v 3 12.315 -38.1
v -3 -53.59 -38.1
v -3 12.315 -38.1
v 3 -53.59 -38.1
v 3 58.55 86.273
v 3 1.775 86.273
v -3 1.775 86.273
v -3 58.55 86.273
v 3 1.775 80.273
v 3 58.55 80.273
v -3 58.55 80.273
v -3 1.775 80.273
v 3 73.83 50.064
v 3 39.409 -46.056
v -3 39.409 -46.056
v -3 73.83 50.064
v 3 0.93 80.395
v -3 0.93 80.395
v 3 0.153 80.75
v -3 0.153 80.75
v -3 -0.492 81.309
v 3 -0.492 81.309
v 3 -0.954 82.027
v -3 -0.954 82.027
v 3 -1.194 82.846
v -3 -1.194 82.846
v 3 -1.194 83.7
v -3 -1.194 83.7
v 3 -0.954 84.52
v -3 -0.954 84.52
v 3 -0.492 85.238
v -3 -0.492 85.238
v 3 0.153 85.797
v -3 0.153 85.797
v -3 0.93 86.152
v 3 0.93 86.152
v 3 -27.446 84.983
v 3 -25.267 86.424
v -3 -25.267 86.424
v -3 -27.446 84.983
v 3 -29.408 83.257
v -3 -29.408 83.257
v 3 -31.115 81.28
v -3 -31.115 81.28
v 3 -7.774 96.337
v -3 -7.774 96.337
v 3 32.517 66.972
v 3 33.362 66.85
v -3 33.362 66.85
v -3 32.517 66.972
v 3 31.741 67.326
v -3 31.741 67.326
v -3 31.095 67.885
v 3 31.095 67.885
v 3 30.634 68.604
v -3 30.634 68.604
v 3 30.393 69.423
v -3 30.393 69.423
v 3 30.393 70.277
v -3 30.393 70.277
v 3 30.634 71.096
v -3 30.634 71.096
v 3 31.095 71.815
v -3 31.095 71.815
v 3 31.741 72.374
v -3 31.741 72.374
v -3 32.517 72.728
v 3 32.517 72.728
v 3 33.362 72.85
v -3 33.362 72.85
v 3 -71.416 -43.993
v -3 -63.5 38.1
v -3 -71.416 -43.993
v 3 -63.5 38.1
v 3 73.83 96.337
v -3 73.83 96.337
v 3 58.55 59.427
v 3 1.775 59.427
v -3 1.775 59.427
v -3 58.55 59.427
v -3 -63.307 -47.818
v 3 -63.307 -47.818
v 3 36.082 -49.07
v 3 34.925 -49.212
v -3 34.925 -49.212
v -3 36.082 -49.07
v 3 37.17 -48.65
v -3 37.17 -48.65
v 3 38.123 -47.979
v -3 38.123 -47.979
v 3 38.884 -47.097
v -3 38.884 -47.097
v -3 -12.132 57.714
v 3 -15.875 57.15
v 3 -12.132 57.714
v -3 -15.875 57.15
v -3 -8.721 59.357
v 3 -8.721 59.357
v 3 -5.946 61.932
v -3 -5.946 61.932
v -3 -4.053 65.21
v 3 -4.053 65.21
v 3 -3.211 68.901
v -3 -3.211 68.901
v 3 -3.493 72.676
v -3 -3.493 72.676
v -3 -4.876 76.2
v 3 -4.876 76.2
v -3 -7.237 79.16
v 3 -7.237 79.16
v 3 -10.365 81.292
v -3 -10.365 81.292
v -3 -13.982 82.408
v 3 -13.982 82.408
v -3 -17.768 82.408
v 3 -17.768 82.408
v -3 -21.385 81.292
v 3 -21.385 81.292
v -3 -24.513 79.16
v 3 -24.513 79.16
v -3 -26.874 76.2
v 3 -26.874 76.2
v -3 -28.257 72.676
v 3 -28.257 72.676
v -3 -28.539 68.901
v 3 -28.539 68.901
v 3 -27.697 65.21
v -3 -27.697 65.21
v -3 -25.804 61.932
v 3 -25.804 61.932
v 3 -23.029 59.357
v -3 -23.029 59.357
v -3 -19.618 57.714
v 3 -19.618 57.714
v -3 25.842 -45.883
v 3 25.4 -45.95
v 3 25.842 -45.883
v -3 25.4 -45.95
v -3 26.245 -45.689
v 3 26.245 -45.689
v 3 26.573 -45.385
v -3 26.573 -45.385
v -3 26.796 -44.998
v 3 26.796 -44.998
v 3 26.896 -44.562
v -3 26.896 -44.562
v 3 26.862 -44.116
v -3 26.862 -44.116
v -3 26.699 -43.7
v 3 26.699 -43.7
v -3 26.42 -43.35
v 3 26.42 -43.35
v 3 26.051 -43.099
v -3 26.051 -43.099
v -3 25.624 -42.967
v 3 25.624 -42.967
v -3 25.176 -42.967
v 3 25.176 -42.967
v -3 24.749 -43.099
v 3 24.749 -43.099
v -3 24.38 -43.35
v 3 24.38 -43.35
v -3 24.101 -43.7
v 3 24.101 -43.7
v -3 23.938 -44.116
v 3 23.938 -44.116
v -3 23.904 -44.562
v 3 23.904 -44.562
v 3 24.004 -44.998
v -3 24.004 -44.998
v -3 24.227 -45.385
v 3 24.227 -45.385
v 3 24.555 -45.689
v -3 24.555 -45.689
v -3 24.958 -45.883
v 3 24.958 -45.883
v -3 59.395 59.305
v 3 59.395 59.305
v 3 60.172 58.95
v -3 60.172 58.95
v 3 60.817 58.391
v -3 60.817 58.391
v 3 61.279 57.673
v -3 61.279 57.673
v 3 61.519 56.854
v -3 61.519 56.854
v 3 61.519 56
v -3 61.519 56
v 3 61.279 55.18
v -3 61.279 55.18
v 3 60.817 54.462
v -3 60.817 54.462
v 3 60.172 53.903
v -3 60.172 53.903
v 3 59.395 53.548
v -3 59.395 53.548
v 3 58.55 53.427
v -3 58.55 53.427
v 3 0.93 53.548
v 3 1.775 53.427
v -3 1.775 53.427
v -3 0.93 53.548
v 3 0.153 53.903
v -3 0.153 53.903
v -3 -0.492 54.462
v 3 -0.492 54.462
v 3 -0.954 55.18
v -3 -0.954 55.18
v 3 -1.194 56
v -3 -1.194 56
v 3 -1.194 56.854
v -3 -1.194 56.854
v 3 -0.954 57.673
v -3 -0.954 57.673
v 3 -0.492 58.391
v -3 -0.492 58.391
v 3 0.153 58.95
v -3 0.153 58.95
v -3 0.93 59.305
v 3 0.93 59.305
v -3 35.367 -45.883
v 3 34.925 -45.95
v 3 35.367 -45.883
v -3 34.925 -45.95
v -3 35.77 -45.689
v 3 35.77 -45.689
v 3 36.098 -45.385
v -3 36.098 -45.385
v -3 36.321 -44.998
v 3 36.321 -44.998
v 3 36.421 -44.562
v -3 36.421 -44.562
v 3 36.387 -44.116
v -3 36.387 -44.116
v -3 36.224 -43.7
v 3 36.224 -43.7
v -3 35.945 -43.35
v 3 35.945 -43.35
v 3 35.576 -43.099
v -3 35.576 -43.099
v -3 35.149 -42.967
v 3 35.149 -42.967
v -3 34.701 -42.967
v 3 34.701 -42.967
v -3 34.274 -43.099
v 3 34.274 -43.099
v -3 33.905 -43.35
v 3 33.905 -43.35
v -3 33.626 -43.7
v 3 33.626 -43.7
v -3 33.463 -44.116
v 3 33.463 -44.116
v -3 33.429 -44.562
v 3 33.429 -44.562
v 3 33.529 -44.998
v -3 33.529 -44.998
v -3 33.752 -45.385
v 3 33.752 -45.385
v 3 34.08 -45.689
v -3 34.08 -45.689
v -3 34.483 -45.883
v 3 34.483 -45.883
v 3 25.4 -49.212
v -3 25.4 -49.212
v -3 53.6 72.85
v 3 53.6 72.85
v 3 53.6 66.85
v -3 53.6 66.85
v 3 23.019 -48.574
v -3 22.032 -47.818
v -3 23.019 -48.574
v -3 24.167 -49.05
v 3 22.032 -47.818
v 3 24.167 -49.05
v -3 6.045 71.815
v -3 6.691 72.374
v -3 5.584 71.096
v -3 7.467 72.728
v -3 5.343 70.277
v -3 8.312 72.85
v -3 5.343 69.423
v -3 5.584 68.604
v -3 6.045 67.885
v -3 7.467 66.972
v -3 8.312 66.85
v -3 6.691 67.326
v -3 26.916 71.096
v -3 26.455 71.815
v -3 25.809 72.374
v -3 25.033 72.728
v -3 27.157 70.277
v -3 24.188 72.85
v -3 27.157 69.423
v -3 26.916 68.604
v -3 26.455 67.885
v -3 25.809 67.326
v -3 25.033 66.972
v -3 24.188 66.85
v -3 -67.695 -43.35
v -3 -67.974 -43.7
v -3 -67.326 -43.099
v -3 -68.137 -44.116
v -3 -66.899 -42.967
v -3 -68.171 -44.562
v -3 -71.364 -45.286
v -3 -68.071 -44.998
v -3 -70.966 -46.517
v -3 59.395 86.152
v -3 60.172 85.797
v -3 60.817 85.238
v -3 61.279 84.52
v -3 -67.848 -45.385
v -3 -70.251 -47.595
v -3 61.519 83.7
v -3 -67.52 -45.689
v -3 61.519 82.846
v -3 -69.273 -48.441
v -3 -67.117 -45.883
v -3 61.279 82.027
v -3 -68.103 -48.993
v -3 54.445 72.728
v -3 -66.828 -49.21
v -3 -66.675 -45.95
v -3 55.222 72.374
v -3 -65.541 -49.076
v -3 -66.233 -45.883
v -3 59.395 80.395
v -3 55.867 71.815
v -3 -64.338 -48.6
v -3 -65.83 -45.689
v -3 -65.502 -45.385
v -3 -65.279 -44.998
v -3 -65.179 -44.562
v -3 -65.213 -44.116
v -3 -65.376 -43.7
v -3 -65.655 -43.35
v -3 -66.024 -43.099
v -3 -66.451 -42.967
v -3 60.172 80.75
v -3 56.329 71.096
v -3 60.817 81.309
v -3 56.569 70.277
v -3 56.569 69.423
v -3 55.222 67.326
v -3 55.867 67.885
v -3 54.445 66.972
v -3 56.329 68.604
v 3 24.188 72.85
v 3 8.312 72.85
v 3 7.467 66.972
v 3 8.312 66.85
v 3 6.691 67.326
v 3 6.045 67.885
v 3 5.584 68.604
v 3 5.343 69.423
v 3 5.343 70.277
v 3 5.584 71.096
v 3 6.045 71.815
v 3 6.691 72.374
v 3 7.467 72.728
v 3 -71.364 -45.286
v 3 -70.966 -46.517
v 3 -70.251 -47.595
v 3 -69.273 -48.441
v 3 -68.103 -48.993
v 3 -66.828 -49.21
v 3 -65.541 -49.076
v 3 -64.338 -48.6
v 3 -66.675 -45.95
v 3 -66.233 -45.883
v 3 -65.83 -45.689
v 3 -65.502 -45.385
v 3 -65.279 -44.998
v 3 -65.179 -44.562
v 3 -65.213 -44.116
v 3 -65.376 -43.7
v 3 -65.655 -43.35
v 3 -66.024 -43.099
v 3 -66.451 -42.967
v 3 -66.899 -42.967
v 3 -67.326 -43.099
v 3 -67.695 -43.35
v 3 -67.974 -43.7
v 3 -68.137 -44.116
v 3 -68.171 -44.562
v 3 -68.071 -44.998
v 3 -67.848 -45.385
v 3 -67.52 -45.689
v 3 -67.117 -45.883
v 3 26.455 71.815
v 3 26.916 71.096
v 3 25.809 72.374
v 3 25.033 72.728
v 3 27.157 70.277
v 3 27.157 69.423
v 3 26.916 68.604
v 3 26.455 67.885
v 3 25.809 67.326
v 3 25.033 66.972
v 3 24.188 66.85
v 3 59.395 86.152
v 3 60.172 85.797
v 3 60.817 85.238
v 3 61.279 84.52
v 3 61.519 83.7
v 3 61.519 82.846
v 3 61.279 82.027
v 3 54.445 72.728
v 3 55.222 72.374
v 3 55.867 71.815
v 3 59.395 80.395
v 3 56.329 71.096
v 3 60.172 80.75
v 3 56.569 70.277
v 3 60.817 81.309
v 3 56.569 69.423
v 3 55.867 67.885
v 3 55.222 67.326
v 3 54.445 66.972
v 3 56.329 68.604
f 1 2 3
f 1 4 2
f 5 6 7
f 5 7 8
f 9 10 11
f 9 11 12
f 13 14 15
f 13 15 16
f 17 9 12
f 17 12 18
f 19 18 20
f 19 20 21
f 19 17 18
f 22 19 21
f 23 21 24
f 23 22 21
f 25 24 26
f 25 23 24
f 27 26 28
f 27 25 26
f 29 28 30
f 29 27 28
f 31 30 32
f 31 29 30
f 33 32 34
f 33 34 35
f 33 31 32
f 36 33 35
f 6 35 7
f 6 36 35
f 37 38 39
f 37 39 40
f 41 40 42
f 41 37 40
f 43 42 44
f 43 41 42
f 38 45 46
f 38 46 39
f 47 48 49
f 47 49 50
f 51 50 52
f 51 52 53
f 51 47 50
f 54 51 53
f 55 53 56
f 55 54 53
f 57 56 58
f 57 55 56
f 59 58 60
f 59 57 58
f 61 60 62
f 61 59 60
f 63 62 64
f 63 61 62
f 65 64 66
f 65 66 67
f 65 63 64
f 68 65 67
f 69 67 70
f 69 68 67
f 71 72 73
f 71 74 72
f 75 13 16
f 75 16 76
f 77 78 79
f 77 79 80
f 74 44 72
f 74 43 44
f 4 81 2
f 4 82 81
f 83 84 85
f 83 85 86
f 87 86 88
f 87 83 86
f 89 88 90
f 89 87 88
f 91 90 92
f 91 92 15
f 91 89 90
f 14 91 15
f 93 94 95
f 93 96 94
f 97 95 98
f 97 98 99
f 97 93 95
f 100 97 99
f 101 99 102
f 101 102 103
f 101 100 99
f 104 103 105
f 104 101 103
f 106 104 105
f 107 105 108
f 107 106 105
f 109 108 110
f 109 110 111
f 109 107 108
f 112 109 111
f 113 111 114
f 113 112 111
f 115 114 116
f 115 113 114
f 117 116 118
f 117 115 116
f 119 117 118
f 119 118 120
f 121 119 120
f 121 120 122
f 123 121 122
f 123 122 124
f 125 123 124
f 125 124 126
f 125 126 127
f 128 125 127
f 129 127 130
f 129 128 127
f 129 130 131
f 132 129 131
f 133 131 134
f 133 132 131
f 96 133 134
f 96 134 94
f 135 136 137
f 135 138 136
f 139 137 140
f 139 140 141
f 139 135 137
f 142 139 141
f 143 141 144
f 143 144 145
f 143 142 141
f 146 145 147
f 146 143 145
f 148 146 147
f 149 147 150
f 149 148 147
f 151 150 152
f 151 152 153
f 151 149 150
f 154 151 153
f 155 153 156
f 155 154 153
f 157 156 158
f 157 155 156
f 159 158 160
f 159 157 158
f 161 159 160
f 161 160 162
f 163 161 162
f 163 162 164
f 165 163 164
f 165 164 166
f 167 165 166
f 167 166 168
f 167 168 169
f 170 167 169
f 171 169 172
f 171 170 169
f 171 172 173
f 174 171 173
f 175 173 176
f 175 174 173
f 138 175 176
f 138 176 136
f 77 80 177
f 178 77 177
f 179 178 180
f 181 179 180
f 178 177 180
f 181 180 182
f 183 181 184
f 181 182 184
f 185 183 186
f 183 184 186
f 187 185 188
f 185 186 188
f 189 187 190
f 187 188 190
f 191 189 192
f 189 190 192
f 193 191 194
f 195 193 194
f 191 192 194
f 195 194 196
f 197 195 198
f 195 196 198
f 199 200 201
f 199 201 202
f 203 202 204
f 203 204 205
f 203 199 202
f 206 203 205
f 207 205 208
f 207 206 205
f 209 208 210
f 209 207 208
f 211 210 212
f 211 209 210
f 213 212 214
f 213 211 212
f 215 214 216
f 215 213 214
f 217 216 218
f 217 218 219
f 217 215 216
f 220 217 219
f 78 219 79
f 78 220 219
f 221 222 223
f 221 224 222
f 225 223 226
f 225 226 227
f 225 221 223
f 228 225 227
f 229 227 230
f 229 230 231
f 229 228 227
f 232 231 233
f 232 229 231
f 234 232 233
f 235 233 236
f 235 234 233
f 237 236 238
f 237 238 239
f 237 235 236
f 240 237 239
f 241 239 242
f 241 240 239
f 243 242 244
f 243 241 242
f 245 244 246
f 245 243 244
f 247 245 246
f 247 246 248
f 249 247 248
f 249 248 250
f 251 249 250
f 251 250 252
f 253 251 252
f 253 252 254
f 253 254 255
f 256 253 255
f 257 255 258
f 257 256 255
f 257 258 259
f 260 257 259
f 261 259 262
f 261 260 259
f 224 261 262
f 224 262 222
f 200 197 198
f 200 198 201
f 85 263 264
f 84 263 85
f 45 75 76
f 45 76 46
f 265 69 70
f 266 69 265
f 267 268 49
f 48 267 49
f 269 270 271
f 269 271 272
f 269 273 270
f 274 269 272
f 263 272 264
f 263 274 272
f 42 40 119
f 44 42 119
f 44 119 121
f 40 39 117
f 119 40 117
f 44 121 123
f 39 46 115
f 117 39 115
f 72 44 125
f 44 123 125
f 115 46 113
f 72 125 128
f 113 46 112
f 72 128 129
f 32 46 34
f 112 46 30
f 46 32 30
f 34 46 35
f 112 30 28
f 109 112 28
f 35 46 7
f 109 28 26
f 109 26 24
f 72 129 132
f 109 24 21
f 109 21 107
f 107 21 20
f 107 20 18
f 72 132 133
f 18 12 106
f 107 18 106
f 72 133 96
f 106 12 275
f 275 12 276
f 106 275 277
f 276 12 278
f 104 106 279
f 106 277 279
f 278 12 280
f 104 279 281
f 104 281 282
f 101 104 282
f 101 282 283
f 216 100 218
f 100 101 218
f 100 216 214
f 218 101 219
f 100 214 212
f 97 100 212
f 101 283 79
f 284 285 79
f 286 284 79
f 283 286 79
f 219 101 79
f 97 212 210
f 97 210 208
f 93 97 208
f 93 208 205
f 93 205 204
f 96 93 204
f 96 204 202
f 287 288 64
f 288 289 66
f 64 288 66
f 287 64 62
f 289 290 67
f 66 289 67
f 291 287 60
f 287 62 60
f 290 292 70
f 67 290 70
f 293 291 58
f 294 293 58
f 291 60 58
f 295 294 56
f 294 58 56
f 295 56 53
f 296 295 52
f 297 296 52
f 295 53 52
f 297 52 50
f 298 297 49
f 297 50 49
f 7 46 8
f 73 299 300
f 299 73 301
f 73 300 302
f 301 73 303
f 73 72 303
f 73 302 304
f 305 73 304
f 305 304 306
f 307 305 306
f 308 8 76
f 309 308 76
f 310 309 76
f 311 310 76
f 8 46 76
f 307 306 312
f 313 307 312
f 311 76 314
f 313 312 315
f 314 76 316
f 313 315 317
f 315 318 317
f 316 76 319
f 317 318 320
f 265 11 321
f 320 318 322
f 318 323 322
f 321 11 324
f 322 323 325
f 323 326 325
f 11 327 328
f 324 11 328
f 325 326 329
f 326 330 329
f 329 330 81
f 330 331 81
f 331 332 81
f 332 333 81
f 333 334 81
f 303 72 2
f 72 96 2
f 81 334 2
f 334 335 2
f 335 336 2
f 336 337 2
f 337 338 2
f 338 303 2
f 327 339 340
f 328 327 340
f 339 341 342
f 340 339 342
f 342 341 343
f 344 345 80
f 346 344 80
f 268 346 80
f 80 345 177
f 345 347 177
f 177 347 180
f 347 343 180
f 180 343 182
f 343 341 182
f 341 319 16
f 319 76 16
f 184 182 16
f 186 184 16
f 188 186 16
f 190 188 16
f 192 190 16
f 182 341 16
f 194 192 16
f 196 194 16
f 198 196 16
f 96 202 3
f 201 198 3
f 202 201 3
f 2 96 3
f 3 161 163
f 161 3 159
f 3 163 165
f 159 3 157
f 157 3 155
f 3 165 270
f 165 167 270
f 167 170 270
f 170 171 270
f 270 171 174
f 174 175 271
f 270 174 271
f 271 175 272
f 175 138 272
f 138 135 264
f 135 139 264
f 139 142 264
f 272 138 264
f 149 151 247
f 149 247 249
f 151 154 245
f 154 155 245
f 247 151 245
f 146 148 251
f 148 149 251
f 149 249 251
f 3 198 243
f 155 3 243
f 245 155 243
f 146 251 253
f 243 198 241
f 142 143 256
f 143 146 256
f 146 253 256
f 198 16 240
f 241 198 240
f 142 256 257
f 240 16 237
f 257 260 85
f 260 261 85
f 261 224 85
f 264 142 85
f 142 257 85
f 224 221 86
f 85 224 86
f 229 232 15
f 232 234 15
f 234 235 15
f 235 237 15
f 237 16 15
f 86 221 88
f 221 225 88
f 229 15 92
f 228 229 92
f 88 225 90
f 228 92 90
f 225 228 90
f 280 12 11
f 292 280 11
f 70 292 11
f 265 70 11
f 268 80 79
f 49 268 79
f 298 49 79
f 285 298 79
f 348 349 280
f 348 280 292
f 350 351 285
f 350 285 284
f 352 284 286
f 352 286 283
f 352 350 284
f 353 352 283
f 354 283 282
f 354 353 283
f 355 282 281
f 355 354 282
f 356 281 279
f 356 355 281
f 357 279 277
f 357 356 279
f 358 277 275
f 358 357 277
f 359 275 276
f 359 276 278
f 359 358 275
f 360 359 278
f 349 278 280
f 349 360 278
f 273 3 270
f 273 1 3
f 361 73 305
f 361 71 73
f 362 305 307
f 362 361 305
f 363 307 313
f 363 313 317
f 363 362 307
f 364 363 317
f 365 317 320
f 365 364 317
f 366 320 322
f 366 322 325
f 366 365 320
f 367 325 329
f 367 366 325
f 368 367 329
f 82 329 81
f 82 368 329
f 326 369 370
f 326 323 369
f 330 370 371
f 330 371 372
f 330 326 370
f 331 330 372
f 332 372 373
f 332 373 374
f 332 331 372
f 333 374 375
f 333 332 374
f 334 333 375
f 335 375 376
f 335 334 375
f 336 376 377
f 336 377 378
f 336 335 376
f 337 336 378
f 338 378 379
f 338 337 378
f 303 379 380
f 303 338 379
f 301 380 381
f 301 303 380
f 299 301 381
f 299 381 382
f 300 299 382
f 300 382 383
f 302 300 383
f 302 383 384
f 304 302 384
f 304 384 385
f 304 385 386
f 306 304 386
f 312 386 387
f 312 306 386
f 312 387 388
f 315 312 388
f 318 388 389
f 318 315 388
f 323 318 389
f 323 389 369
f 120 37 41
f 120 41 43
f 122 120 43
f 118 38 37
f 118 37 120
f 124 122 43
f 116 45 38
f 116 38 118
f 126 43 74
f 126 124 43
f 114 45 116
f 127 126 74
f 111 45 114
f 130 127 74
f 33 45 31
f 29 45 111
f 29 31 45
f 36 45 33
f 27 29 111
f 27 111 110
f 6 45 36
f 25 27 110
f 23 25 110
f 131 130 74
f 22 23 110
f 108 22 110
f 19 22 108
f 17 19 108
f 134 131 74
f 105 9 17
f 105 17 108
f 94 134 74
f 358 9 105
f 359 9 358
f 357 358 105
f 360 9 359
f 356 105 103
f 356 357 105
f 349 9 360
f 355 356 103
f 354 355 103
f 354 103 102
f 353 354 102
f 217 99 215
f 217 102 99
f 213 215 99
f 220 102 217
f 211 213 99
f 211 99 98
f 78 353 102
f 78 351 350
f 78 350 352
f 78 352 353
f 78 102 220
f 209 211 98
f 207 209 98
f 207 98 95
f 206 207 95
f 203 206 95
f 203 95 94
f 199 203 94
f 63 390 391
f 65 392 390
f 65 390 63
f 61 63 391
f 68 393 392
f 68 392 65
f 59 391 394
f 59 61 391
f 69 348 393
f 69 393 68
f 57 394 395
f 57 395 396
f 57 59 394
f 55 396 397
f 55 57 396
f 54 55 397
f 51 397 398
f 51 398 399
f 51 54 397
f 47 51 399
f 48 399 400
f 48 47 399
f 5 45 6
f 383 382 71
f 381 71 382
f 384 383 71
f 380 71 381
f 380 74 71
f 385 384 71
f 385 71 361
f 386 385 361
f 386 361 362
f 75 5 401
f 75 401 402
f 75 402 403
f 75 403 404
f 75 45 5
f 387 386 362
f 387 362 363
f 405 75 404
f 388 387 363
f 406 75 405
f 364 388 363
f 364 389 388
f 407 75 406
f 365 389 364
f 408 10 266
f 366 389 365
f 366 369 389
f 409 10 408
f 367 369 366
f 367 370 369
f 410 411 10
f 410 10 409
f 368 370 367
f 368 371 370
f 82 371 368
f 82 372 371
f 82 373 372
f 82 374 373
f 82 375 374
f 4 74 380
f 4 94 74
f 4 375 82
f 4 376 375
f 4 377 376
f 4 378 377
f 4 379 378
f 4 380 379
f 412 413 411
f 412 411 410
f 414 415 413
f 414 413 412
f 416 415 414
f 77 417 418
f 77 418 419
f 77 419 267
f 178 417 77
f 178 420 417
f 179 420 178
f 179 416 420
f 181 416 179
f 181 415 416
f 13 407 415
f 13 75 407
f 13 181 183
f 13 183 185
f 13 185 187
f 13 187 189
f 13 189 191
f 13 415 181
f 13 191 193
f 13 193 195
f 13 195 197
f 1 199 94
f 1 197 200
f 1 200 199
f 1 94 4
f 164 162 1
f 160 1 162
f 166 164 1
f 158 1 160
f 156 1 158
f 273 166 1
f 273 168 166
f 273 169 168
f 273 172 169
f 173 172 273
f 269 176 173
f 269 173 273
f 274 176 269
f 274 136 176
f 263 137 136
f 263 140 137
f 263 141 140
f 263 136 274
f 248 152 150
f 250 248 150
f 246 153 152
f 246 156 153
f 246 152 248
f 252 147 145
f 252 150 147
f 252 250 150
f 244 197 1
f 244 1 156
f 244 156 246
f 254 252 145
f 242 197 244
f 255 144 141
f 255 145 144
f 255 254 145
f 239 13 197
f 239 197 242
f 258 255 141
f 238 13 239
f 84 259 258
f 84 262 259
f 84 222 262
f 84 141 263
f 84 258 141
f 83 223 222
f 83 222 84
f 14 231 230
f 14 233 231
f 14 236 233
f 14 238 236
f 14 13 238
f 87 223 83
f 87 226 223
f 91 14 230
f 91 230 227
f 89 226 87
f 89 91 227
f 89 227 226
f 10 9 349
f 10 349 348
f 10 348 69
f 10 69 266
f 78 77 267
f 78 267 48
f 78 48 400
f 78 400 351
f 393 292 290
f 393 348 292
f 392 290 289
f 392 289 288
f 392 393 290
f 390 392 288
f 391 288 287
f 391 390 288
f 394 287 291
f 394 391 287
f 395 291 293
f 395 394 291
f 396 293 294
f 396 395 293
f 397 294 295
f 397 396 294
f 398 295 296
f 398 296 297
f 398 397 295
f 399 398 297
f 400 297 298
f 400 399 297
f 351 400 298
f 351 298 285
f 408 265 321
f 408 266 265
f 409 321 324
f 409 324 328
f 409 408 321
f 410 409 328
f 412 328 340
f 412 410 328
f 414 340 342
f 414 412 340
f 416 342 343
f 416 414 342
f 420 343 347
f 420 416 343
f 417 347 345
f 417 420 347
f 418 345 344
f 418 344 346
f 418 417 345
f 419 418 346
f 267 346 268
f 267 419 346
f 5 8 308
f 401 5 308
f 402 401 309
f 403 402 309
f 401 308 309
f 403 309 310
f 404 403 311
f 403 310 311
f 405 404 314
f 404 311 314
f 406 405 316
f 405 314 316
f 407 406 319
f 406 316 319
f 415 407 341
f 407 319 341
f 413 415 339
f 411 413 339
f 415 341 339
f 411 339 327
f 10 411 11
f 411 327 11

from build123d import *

# Parameters (mm, degrees)
SKETCH4_R           = 1.5
SKETCH4_R_2         = 19.05
SKETCH4_R_3         = 12.7
BOSS_EXTRUDE1_DEPTH = 3


with BuildPart() as part:
    # Sketch4 → Boss-Extrude1 (new, symmetric)
    # profile 1 of 3: a face of its own
    with BuildSketch(Plane(origin=(0, 0, 0), x_dir=(0, 0, -1), z_dir=(1, 0, 0))):
        with BuildLine():
            ThreePointArc((47.817596045, 22.032403955), (48.849976274, 23.577470153), (49.2125, 25.4))
            Line((49.2125, 25.4), (49.2125, 34.925))
            ThreePointArc((49.2125, 34.925), (48.344113354, 37.66676721), (46.055633886, 39.40867551))
            Line((46.055633886, 39.40867551), (-50.063626234, 73.829618952))
            Line((-50.063626234, 73.829618952), (-96.337100071, 73.829618952))
            Line((-96.337100071, 73.829618952), (-96.337100071, -7.774310331))
            Line((-96.337100071, -7.774310331), (-86.423631694, -25.267402912))
            ThreePointArc((-86.423631694, -25.267402912), (-74.706686948, 2.545507373), (-50.8, -15.875))
            ThreePointArc((-50.8, -15.875), (-61.330581006, -32.913837989), (-81.28, -31.115))
            Line((-81.28, -31.115), (-38.1, -63.5))
            Line((-38.1, -63.5), (43.992912904, -71.415514491))
            ThreePointArc((43.992912904, -71.415514491), (48.757334408, -68.706816071), (47.817596045, -63.307403955))
            Line((47.817596045, -63.307403955), (38.1, -53.589807909))
            Line((38.1, -53.589807909), (38.1, 12.314807909))
            Line((38.1, 12.314807909), (47.817596045, 22.032403955))
        make_face()
        with Locations((44.45, -66.675)):
            Circle(SKETCH4_R, mode=Mode.SUBTRACT)
        with BuildLine():
            ThreePointArc((-80.273393759, 1.775), (-83.273393759, -1.225), (-86.273393759, 1.775))
            Line((-86.273393759, 1.775), (-86.273393759, 58.55))
            ThreePointArc((-86.273393759, 58.55), (-83.273393759, 61.55), (-80.273393759, 58.55))
            Line((-80.273393759, 58.55), (-80.273393759, 1.775))
        make_face(mode=Mode.SUBTRACT)
        with BuildLine():
            ThreePointArc((-66.85, 8.3125), (-69.85, 5.3125), (-72.85, 8.3125))
            Line((-72.85, 8.3125), (-72.85, 24.1875))
            Line((-72.85, 24.1875), (-72.85, 33.3625))
            Line((-72.85, 33.3625), (-72.85, 53.6))
            ThreePointArc((-72.85, 53.6), (-69.85, 56.6), (-66.85, 53.6))
            Line((-66.85, 53.6), (-66.85, 33.3625))
            Line((-66.85, 33.3625), (-66.85, 24.1875))
            Line((-66.85, 24.1875), (-66.85, 8.3125))
        make_face(mode=Mode.SUBTRACT)
        with BuildLine():
            ThreePointArc((-53.426606241, 1.775), (-56.426606241, -1.225), (-59.426606241, 1.775))
            Line((-59.426606241, 1.775), (-59.426606241, 58.55))
            ThreePointArc((-59.426606241, 58.55), (-56.426606241, 61.55), (-53.426606241, 58.55))
            Line((-53.426606241, 58.55), (-53.426606241, 1.775))
        make_face(mode=Mode.SUBTRACT)
        with Locations((44.45, 25.4)):
            Circle(SKETCH4_R, mode=Mode.SUBTRACT)
        with Locations((44.45, 34.925)):
            Circle(SKETCH4_R, mode=Mode.SUBTRACT)
    # profile 2 of 3: a face of its own
    with BuildSketch(Plane(origin=(0, 0, 0), x_dir=(0, 0, -1), z_dir=(1, 0, 0))):
        with Locations((-69.85, -15.875)):
            Circle(SKETCH4_R_2)
        with Locations((-69.85, -15.875)):
            Circle(SKETCH4_R_3, mode=Mode.SUBTRACT)
    # profile 3 of 3: a face of its own
    with BuildSketch(Plane(origin=(0, 0, 0), x_dir=(0, 0, -1), z_dir=(1, 0, 0))):
        with BuildLine():
            Line((-72.85, 33.3625), (-72.85, 24.1875))
            ThreePointArc((-72.85, 24.1875), (-69.85, 27.1875), (-66.85, 24.1875))
            Line((-66.85, 24.1875), (-66.85, 33.3625))
            ThreePointArc((-66.85, 33.3625), (-69.85, 30.3625), (-72.85, 33.3625))
        make_face()
    extrude(amount=BOSS_EXTRUDE1_DEPTH, both=True)


solid = part.part
